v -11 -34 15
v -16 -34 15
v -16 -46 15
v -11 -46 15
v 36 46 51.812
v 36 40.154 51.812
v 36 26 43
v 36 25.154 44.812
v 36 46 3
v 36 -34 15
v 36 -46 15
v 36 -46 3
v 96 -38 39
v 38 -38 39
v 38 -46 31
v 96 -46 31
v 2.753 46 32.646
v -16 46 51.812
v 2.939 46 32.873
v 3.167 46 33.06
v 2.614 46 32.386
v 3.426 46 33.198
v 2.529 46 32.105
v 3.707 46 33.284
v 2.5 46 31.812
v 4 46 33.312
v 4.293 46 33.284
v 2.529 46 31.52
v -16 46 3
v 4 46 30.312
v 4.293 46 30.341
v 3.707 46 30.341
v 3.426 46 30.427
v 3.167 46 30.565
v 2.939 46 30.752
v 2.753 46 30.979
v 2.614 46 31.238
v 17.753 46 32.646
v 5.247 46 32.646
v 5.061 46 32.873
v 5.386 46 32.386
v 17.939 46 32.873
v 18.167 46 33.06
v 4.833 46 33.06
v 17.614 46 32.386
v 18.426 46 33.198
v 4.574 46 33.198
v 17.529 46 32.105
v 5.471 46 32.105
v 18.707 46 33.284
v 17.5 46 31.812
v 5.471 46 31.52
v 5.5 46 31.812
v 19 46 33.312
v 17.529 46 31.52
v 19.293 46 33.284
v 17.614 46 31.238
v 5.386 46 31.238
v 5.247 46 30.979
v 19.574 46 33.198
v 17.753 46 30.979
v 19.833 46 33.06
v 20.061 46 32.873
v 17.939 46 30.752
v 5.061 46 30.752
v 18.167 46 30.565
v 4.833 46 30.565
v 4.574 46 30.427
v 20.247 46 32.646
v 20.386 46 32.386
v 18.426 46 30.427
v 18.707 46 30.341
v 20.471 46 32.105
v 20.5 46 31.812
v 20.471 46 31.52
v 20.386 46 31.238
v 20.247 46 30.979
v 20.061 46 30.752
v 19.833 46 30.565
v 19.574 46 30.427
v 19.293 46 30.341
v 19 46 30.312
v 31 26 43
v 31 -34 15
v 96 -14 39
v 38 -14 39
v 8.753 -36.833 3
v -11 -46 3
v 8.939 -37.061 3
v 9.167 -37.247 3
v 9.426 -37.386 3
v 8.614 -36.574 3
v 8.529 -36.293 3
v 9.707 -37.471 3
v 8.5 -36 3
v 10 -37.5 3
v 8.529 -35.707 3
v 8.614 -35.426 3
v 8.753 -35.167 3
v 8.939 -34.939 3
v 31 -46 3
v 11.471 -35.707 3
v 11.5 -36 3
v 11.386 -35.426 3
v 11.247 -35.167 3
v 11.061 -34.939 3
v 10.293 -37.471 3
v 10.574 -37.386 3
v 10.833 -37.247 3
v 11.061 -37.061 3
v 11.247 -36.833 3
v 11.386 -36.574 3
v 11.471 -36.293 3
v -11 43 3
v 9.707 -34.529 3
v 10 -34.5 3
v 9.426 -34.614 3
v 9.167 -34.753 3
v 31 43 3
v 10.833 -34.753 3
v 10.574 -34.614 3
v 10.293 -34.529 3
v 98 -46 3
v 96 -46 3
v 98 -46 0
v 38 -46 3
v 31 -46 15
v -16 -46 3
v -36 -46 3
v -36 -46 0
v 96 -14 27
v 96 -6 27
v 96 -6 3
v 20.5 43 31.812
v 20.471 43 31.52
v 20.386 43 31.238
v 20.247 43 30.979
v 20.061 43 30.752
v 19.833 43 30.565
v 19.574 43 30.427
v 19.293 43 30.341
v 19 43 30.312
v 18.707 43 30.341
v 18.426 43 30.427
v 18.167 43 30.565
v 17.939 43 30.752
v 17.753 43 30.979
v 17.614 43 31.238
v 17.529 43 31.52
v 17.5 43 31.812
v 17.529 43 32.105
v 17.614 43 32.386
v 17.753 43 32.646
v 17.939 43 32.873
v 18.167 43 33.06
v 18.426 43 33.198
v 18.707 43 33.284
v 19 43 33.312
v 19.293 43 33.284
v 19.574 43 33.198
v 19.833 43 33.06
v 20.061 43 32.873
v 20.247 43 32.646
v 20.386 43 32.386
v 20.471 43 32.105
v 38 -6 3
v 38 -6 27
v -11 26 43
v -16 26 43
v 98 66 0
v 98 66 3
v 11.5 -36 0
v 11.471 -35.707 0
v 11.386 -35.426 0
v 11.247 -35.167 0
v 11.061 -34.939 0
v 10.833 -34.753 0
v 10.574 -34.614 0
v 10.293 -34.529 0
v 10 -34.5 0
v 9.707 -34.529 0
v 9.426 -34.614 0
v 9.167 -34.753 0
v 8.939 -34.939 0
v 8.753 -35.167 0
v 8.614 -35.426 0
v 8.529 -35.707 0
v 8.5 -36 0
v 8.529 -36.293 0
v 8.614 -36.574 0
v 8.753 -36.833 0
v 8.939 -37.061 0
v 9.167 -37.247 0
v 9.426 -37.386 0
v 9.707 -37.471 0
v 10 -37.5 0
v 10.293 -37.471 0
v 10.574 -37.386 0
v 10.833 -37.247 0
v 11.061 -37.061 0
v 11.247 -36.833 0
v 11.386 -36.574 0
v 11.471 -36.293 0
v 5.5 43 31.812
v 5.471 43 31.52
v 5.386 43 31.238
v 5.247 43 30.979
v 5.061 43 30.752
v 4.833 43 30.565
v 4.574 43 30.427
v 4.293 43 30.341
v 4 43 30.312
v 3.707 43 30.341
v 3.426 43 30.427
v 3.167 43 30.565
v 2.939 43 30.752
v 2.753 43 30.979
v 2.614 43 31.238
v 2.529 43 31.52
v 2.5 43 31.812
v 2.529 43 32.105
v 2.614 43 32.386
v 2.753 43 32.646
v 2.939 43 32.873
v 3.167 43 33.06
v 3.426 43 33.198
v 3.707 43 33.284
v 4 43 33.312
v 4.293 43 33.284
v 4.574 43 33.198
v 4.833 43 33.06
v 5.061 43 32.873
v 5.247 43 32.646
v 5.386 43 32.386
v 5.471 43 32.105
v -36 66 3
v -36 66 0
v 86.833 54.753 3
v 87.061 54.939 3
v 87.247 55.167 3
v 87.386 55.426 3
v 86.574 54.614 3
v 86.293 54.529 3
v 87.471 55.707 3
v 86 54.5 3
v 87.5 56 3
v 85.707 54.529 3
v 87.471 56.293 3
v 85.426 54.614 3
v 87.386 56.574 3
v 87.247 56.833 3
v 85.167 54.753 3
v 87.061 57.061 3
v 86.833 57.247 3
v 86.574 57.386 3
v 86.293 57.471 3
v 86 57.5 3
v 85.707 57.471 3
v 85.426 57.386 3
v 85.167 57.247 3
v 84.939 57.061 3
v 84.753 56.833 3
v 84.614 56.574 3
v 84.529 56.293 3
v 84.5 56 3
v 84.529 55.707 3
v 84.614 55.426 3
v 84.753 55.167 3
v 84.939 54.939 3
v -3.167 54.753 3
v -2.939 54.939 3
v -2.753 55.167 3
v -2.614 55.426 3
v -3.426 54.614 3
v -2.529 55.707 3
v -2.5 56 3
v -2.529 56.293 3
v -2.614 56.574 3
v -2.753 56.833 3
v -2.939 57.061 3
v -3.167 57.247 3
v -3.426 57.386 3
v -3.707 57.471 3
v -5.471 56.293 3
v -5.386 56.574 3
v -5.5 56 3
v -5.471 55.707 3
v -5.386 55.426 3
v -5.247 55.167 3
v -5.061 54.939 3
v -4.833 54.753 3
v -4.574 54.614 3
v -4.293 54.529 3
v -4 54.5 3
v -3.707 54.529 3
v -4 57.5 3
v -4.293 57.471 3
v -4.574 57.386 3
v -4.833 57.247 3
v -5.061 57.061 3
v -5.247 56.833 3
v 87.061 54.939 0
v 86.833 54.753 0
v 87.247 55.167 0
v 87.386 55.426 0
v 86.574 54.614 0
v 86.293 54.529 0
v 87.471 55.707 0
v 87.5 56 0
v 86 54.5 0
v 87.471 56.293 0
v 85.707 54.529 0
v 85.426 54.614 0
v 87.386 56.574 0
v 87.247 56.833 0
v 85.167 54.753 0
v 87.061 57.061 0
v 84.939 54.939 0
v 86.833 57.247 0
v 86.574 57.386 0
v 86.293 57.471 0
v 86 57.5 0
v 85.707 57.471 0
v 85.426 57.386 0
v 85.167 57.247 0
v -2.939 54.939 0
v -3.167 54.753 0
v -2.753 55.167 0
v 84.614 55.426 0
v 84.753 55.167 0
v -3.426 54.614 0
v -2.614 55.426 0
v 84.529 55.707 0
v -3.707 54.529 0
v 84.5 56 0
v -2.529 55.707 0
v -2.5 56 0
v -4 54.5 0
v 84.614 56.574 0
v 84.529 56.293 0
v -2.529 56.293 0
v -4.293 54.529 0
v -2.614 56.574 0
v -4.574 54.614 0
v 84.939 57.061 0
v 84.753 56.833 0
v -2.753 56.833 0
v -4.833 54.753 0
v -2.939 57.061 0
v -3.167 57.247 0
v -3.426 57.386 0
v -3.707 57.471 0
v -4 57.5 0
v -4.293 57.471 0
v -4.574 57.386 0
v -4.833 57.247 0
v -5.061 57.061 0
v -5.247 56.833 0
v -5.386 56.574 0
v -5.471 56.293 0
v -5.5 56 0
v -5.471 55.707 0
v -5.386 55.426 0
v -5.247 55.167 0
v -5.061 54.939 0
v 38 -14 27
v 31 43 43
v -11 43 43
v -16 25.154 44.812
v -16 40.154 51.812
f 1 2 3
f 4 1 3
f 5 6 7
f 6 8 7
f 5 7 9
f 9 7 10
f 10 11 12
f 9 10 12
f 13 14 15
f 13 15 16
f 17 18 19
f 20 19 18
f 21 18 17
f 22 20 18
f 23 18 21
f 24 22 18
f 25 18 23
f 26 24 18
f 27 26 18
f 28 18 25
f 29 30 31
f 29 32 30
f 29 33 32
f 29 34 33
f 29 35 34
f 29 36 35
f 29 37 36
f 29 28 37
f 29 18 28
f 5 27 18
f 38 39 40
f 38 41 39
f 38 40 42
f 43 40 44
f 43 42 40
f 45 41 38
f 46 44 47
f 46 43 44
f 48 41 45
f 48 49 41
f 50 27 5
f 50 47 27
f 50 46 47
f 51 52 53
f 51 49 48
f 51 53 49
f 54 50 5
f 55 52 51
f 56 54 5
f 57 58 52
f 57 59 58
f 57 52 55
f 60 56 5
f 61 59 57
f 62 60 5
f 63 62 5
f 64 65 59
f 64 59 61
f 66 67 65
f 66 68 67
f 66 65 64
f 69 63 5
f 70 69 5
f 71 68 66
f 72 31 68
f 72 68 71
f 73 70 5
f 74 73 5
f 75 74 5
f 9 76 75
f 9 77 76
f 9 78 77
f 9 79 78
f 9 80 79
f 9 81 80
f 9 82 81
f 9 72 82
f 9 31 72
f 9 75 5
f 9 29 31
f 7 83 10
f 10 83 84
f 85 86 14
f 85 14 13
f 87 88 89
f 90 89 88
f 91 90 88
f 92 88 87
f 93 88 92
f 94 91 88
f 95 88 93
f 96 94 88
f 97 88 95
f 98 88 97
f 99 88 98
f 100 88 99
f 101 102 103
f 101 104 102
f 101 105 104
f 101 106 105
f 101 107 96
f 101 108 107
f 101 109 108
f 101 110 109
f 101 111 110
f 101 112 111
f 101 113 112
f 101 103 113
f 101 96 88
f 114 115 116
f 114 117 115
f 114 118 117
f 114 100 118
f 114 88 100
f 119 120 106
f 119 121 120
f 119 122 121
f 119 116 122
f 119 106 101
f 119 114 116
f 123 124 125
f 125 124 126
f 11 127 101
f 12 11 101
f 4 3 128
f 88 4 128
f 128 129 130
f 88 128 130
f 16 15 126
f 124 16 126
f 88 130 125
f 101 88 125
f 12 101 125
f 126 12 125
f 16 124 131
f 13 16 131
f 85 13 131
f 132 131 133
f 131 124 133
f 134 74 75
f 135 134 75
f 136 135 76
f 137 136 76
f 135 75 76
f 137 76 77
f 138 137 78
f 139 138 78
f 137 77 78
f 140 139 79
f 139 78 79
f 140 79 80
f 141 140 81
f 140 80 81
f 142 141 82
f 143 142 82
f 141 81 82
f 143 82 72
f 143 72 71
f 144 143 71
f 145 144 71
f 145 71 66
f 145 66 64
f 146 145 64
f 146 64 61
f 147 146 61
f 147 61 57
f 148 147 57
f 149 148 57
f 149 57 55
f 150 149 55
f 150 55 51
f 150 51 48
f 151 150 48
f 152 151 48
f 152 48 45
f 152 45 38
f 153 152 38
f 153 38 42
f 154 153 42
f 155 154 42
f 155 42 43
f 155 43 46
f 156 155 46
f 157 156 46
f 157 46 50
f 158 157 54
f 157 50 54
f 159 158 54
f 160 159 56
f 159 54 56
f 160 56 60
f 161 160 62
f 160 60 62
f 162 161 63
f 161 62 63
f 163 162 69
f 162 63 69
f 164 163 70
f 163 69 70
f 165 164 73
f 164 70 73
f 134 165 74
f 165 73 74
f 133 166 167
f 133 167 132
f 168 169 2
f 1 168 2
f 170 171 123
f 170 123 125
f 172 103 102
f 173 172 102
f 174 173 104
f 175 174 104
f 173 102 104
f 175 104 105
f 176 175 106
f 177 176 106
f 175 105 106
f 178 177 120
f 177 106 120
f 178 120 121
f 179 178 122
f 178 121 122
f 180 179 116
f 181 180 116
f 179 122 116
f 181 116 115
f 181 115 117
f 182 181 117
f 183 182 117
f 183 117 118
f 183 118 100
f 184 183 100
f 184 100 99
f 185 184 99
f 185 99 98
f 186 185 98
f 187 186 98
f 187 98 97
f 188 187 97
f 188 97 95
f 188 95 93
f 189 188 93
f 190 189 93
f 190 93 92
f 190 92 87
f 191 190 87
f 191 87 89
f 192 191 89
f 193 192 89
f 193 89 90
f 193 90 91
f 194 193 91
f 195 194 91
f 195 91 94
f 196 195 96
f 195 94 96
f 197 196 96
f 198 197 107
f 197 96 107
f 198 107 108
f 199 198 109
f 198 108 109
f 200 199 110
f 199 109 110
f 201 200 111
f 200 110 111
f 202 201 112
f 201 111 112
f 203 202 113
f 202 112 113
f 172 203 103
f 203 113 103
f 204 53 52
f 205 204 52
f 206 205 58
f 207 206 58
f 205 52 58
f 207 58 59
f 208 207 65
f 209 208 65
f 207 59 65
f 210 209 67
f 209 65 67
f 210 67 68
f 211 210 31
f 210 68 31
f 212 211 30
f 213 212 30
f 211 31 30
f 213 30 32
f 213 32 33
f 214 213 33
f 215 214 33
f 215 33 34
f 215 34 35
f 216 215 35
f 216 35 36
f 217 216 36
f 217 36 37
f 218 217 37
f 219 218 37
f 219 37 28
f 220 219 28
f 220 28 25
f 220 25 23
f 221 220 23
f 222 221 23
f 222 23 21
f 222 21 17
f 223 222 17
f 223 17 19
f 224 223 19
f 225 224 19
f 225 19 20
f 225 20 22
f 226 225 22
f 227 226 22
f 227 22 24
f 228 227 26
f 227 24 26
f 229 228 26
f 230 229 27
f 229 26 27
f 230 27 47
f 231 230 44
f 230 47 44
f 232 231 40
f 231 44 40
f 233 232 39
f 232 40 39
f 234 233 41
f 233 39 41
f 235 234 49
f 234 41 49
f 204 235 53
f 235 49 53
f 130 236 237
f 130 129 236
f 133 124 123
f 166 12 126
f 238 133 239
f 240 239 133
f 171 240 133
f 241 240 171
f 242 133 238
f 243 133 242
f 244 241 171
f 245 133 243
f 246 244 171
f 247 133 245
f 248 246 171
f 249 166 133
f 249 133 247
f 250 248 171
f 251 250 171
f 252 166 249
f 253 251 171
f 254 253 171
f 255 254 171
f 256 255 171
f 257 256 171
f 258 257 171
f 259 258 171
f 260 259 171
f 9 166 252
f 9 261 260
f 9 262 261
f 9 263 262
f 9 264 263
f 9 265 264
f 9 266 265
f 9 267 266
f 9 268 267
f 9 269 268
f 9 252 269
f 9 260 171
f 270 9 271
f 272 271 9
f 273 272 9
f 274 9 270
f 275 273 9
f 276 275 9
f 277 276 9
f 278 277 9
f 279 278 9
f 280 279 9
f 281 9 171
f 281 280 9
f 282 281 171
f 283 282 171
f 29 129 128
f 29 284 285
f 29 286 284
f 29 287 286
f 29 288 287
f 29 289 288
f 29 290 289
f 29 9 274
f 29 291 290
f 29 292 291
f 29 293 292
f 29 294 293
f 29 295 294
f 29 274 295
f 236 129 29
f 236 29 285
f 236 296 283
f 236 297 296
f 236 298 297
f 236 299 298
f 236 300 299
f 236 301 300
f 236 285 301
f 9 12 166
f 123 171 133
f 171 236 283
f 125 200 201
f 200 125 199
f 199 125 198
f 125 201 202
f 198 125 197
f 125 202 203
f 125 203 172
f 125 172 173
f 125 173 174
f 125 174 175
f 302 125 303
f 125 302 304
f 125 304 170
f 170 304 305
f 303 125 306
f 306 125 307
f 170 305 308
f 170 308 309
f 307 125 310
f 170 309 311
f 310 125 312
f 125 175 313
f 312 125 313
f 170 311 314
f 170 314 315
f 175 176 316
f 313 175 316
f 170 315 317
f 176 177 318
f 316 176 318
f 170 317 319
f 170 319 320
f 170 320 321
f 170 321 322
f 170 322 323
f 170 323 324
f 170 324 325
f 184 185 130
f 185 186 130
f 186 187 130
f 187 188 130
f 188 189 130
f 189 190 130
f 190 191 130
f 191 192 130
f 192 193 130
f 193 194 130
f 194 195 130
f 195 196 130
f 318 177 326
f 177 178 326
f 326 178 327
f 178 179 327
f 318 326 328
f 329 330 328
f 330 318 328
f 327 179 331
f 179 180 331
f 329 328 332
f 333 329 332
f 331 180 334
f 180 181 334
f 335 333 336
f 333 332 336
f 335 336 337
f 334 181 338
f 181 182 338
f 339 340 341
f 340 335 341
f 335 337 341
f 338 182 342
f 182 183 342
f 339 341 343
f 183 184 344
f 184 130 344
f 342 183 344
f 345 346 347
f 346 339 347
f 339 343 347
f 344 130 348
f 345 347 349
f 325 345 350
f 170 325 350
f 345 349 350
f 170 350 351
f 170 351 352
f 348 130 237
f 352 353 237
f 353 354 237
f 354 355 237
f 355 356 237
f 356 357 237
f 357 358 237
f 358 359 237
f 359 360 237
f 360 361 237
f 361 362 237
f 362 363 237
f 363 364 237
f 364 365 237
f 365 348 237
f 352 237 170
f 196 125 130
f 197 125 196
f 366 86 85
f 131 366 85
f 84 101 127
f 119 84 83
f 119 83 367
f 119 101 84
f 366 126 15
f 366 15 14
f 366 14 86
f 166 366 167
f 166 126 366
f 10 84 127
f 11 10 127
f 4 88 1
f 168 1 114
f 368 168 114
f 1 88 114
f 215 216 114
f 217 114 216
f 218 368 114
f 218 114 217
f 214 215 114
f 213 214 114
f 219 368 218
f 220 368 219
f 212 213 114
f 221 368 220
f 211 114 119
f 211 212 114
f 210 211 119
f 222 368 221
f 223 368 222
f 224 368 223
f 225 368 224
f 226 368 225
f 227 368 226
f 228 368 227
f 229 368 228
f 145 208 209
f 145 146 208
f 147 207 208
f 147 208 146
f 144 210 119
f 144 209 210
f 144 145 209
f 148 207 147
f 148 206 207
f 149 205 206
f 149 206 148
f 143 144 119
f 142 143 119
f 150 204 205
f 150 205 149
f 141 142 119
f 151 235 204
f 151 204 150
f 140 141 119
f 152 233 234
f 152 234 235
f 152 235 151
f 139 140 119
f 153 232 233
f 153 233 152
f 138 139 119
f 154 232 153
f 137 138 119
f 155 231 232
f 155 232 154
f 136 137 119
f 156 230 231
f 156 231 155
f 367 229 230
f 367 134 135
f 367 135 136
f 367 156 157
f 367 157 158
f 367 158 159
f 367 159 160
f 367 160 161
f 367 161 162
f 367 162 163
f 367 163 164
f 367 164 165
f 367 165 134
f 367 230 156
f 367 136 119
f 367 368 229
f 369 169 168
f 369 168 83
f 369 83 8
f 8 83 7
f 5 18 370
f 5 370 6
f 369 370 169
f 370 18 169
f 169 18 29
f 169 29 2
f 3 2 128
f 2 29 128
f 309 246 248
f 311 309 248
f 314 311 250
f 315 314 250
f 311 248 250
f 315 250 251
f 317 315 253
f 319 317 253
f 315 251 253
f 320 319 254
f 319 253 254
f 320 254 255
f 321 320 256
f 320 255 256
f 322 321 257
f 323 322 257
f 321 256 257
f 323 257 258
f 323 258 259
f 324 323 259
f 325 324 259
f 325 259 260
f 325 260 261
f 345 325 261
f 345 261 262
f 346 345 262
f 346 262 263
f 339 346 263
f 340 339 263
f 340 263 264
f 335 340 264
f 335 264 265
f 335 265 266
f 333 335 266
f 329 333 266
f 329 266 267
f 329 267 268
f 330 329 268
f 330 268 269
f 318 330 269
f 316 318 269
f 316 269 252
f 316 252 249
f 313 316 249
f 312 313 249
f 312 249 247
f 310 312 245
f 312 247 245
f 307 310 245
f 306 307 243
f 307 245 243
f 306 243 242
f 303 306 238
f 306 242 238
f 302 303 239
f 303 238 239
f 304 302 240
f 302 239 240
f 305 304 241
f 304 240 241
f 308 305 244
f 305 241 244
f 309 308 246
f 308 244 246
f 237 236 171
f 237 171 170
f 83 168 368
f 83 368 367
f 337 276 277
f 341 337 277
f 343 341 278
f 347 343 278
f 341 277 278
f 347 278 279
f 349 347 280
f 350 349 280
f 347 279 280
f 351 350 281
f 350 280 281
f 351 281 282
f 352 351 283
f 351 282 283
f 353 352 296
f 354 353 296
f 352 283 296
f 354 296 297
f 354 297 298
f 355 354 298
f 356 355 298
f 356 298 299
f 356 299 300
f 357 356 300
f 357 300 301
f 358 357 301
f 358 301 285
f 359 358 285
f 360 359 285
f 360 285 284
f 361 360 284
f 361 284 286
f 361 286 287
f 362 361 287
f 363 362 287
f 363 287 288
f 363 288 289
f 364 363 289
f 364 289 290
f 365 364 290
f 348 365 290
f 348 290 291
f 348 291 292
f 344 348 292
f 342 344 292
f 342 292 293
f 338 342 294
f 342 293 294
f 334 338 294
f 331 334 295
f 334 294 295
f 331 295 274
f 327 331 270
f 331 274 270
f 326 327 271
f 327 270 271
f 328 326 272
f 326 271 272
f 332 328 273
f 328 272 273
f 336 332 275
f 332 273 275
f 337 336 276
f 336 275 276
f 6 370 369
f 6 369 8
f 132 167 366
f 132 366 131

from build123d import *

# Parameters (mm, degrees)
SKETCH1_W           = 72
SKETCH1_H           = 92
BOSS_EXTRUDE1_DEPTH = 3
SKETCH2_W           = 5
SKETCH2_H           = 92
BOSS_EXTRUDE2_DEPTH = 47
BOSS_EXTRUDE3_REACH = 52
SKETCH3_W           = 52
SKETCH3_H           = 20
CUT_EXTRUDE3_REACH  = 54
SKETCH8_W           = 52
SKETCH8_H           = 16.552945357
BOSS_EXTRUDE5_DEPTH = 2
SKETCH9_W           = 52
SKETCH9_H           = 5
SKETCH9_H_2         = 0.845770931
BOSS_EXTRUDE6_DEPTH = 1.812366
SKETCH10_W          = 42
SKETCH10_H          = 40
CUT_EXTRUDE4_DEPTH  = 17
CUT_EXTRUDE5_REACH  = 94
SKETCH12_R          = 1.5
SKETCH13_W          = 72
SKETCH13_H          = 3
BOSS_EXTRUDE7_DEPTH = 20
SKETCH15_W          = 3
SKETCH15_H          = 112
BOSS_EXTRUDE8_DEPTH = 62
SKETCH17_W          = 58
SKETCH17_H          = 40
BOSS_EXTRUDE9_DEPTH = 36
CHAMFER1_SIZE       = 8
SKETCH18_W          = 58
SKETCH18_H          = 8
CUT_EXTRUDE8_DEPTH  = 12
CUT_EXTRUDE9_REACH  = 5
SKETCH14_R          = 1.5


with BuildPart() as part:
    # Sketch1 → Boss-Extrude1 (new body)
    with BuildSketch(Plane.XY):
        Rectangle(SKETCH1_W, SKETCH1_H)
    extrude(amount=BOSS_EXTRUDE1_DEPTH)

    # Sketch2 → Boss-Extrude2 (add)
    with BuildSketch(Plane.XY.offset(3)):
        with Locations((33.5, 0)):
            Rectangle(SKETCH2_W, SKETCH2_H)
        with Locations((-13.5, 0)):
            Rectangle(SKETCH2_W, SKETCH2_H)
    extrude(amount=BOSS_EXTRUDE2_DEPTH)

    # Sketch3 → Boss-Extrude3 (add, up to next)
    with BuildSketch(Plane.XY.offset(50), mode=Mode.PRIVATE) as boss_extrude3_sk1:
        with Locations((10, 36)):
            Rectangle(SKETCH3_W, SKETCH3_H)
    boss_extrude3_tool1 = extrude(boss_extrude3_sk1.sketch, amount=-BOSS_EXTRUDE3_REACH, mode=Mode.PRIVATE) - part.part
    add(boss_extrude3_tool1.solids().sort_by_distance((10, 36, 50))[0])

    # Sketch7 → Cut-Extrude3 (cut, up to next)
    with BuildSketch(Plane.ZY.offset(16), mode=Mode.PRIVATE) as cut_extrude3_sk1:
        Polygon((50, 41), (15, -34), (15, -46), (50, -46), align=None)
    cut_extrude3_tool1 = extrude(cut_extrude3_sk1.sketch, amount=-CUT_EXTRUDE3_REACH, mode=Mode.PRIVATE) & part.part
    add(cut_extrude3_tool1.solids().sort_by_distance((-16, -16.515152, 36.919192))[0], mode=Mode.SUBTRACT)

    # Sketch8 → Boss-Extrude5 (add)
    with BuildSketch(Plane(origin=(0, -11.828467153, 25.346715328), x_dir=(1, 0, 0), z_dir=(0, -0.422885465, 0.90618314))):
        with Locations((10, 50.021309328)):
            Rectangle(SKETCH8_W, SKETCH8_H)
    extrude(amount=BOSS_EXTRUDE5_DEPTH)

    # Sketch9 → Boss-Extrude6 (add)
    with BuildSketch(Plane.XY.offset(50)):
        with Locations((10, 43.5)):
            Rectangle(SKETCH9_W, SKETCH9_H)
        with Locations((10, 40.577114534)):
            Rectangle(SKETCH9_W, SKETCH9_H_2)
    extrude(amount=BOSS_EXTRUDE6_DEPTH)

    # Sketch10 → Cut-Extrude4 (cut)
    with BuildSketch(Plane.XZ.offset(-26)):
        with Locations((10, 23)):
            Rectangle(SKETCH10_W, SKETCH10_H)
    extrude(amount=-CUT_EXTRUDE4_DEPTH, mode=Mode.SUBTRACT)

    # Sketch12 → Cut-Extrude5 (cut, up to next)
    with BuildSketch(Plane(origin=(0, 46, 0), x_dir=(1, 0, 0), z_dir=(0, 1, 0)), mode=Mode.PRIVATE) as cut_extrude5_sk1:
        with Locations((4, -31.81236628)):
            Circle(SKETCH12_R)
    cut_extrude5_tool1 = extrude(cut_extrude5_sk1.sketch, amount=-CUT_EXTRUDE5_REACH, mode=Mode.PRIVATE) & part.part
    add(cut_extrude5_tool1.solids().sort_by_distance((4, 46, 31.812366))[0], mode=Mode.SUBTRACT)
    # Sketch12 → Cut-Extrude5 (cut, up to next)
    with BuildSketch(Plane(origin=(0, 46, 0), x_dir=(1, 0, 0), z_dir=(0, 1, 0)), mode=Mode.PRIVATE) as cut_extrude5_sk2:
        with Locations((19, -31.81236628)):
            Circle(SKETCH12_R)
    cut_extrude5_tool2 = extrude(cut_extrude5_sk2.sketch, amount=-CUT_EXTRUDE5_REACH, mode=Mode.PRIVATE) & part.part
    add(cut_extrude5_tool2.solids().sort_by_distance((19, 46, 31.812366))[0], mode=Mode.SUBTRACT)

    # Sketch13 → Boss-Extrude7 (add)
    with BuildSketch(Plane(origin=(0, 46, 0), x_dir=(1, 0, 0), z_dir=(0, 1, 0))):
        with Locations((0, -1.5)):
            Rectangle(SKETCH13_W, SKETCH13_H)
    extrude(amount=BOSS_EXTRUDE7_DEPTH)

    # Sketch15 → Boss-Extrude8 (add)
    with BuildSketch(Plane(origin=(36, 0, 0), x_dir=(0, 0, -1), z_dir=(1, 0, 0))):
        with Locations((-1.5, 10)):
            Rectangle(SKETCH15_W, SKETCH15_H)
    extrude(amount=BOSS_EXTRUDE8_DEPTH)

    # Sketch17 → Boss-Extrude9 (add)
    with BuildSketch(Plane.XY.offset(3)):
        with Locations((67, -26)):
            Rectangle(SKETCH17_W, SKETCH17_H)
    extrude(amount=BOSS_EXTRUDE9_DEPTH)

    # Chamfer1
    chamfer1_edges = [part.edges().sort_by_distance(p)[0] for p in [
        (67, -46, 39),
    ]]
    chamfer(chamfer1_edges, length=CHAMFER1_SIZE)

    # Sketch18 → Cut-Extrude8 (cut)
    with BuildSketch(Plane.XY.offset(39)):
        with Locations((67, -10)):
            Rectangle(SKETCH18_W, SKETCH18_H)
    extrude(amount=-CUT_EXTRUDE8_DEPTH, mode=Mode.SUBTRACT)

    # Sketch14 → Cut-Extrude9 (cut, up to next)
    with BuildSketch(Plane.XY.offset(3), mode=Mode.PRIVATE) as cut_extrude9_sk1:
        with Locations((86, 56)):
            Circle(SKETCH14_R)
    cut_extrude9_tool1 = extrude(cut_extrude9_sk1.sketch, amount=-CUT_EXTRUDE9_REACH, mode=Mode.PRIVATE) & part.part
    add(cut_extrude9_tool1.solids().sort_by_distance((86, 56, 3))[0], mode=Mode.SUBTRACT)
    # Sketch14 → Cut-Extrude9 (cut, up to next)
    with BuildSketch(Plane.XY.offset(3), mode=Mode.PRIVATE) as cut_extrude9_sk2:
        with Locations((10, -36)):
            Circle(SKETCH14_R)
    cut_extrude9_tool2 = extrude(cut_extrude9_sk2.sketch, amount=-CUT_EXTRUDE9_REACH, mode=Mode.PRIVATE) & part.part
    add(cut_extrude9_tool2.solids().sort_by_distance((10, -36, 3))[0], mode=Mode.SUBTRACT)
    # Sketch14 → Cut-Extrude9 (cut, up to next)
    with BuildSketch(Plane.XY.offset(3), mode=Mode.PRIVATE) as cut_extrude9_sk3:
        with Locations((-4, 56)):
            Circle(SKETCH14_R)
    cut_extrude9_tool3 = extrude(cut_extrude9_sk3.sketch, amount=-CUT_EXTRUDE9_REACH, mode=Mode.PRIVATE) & part.part
    add(cut_extrude9_tool3.solids().sort_by_distance((-4, 56, 3))[0], mode=Mode.SUBTRACT)


solid = part.part
